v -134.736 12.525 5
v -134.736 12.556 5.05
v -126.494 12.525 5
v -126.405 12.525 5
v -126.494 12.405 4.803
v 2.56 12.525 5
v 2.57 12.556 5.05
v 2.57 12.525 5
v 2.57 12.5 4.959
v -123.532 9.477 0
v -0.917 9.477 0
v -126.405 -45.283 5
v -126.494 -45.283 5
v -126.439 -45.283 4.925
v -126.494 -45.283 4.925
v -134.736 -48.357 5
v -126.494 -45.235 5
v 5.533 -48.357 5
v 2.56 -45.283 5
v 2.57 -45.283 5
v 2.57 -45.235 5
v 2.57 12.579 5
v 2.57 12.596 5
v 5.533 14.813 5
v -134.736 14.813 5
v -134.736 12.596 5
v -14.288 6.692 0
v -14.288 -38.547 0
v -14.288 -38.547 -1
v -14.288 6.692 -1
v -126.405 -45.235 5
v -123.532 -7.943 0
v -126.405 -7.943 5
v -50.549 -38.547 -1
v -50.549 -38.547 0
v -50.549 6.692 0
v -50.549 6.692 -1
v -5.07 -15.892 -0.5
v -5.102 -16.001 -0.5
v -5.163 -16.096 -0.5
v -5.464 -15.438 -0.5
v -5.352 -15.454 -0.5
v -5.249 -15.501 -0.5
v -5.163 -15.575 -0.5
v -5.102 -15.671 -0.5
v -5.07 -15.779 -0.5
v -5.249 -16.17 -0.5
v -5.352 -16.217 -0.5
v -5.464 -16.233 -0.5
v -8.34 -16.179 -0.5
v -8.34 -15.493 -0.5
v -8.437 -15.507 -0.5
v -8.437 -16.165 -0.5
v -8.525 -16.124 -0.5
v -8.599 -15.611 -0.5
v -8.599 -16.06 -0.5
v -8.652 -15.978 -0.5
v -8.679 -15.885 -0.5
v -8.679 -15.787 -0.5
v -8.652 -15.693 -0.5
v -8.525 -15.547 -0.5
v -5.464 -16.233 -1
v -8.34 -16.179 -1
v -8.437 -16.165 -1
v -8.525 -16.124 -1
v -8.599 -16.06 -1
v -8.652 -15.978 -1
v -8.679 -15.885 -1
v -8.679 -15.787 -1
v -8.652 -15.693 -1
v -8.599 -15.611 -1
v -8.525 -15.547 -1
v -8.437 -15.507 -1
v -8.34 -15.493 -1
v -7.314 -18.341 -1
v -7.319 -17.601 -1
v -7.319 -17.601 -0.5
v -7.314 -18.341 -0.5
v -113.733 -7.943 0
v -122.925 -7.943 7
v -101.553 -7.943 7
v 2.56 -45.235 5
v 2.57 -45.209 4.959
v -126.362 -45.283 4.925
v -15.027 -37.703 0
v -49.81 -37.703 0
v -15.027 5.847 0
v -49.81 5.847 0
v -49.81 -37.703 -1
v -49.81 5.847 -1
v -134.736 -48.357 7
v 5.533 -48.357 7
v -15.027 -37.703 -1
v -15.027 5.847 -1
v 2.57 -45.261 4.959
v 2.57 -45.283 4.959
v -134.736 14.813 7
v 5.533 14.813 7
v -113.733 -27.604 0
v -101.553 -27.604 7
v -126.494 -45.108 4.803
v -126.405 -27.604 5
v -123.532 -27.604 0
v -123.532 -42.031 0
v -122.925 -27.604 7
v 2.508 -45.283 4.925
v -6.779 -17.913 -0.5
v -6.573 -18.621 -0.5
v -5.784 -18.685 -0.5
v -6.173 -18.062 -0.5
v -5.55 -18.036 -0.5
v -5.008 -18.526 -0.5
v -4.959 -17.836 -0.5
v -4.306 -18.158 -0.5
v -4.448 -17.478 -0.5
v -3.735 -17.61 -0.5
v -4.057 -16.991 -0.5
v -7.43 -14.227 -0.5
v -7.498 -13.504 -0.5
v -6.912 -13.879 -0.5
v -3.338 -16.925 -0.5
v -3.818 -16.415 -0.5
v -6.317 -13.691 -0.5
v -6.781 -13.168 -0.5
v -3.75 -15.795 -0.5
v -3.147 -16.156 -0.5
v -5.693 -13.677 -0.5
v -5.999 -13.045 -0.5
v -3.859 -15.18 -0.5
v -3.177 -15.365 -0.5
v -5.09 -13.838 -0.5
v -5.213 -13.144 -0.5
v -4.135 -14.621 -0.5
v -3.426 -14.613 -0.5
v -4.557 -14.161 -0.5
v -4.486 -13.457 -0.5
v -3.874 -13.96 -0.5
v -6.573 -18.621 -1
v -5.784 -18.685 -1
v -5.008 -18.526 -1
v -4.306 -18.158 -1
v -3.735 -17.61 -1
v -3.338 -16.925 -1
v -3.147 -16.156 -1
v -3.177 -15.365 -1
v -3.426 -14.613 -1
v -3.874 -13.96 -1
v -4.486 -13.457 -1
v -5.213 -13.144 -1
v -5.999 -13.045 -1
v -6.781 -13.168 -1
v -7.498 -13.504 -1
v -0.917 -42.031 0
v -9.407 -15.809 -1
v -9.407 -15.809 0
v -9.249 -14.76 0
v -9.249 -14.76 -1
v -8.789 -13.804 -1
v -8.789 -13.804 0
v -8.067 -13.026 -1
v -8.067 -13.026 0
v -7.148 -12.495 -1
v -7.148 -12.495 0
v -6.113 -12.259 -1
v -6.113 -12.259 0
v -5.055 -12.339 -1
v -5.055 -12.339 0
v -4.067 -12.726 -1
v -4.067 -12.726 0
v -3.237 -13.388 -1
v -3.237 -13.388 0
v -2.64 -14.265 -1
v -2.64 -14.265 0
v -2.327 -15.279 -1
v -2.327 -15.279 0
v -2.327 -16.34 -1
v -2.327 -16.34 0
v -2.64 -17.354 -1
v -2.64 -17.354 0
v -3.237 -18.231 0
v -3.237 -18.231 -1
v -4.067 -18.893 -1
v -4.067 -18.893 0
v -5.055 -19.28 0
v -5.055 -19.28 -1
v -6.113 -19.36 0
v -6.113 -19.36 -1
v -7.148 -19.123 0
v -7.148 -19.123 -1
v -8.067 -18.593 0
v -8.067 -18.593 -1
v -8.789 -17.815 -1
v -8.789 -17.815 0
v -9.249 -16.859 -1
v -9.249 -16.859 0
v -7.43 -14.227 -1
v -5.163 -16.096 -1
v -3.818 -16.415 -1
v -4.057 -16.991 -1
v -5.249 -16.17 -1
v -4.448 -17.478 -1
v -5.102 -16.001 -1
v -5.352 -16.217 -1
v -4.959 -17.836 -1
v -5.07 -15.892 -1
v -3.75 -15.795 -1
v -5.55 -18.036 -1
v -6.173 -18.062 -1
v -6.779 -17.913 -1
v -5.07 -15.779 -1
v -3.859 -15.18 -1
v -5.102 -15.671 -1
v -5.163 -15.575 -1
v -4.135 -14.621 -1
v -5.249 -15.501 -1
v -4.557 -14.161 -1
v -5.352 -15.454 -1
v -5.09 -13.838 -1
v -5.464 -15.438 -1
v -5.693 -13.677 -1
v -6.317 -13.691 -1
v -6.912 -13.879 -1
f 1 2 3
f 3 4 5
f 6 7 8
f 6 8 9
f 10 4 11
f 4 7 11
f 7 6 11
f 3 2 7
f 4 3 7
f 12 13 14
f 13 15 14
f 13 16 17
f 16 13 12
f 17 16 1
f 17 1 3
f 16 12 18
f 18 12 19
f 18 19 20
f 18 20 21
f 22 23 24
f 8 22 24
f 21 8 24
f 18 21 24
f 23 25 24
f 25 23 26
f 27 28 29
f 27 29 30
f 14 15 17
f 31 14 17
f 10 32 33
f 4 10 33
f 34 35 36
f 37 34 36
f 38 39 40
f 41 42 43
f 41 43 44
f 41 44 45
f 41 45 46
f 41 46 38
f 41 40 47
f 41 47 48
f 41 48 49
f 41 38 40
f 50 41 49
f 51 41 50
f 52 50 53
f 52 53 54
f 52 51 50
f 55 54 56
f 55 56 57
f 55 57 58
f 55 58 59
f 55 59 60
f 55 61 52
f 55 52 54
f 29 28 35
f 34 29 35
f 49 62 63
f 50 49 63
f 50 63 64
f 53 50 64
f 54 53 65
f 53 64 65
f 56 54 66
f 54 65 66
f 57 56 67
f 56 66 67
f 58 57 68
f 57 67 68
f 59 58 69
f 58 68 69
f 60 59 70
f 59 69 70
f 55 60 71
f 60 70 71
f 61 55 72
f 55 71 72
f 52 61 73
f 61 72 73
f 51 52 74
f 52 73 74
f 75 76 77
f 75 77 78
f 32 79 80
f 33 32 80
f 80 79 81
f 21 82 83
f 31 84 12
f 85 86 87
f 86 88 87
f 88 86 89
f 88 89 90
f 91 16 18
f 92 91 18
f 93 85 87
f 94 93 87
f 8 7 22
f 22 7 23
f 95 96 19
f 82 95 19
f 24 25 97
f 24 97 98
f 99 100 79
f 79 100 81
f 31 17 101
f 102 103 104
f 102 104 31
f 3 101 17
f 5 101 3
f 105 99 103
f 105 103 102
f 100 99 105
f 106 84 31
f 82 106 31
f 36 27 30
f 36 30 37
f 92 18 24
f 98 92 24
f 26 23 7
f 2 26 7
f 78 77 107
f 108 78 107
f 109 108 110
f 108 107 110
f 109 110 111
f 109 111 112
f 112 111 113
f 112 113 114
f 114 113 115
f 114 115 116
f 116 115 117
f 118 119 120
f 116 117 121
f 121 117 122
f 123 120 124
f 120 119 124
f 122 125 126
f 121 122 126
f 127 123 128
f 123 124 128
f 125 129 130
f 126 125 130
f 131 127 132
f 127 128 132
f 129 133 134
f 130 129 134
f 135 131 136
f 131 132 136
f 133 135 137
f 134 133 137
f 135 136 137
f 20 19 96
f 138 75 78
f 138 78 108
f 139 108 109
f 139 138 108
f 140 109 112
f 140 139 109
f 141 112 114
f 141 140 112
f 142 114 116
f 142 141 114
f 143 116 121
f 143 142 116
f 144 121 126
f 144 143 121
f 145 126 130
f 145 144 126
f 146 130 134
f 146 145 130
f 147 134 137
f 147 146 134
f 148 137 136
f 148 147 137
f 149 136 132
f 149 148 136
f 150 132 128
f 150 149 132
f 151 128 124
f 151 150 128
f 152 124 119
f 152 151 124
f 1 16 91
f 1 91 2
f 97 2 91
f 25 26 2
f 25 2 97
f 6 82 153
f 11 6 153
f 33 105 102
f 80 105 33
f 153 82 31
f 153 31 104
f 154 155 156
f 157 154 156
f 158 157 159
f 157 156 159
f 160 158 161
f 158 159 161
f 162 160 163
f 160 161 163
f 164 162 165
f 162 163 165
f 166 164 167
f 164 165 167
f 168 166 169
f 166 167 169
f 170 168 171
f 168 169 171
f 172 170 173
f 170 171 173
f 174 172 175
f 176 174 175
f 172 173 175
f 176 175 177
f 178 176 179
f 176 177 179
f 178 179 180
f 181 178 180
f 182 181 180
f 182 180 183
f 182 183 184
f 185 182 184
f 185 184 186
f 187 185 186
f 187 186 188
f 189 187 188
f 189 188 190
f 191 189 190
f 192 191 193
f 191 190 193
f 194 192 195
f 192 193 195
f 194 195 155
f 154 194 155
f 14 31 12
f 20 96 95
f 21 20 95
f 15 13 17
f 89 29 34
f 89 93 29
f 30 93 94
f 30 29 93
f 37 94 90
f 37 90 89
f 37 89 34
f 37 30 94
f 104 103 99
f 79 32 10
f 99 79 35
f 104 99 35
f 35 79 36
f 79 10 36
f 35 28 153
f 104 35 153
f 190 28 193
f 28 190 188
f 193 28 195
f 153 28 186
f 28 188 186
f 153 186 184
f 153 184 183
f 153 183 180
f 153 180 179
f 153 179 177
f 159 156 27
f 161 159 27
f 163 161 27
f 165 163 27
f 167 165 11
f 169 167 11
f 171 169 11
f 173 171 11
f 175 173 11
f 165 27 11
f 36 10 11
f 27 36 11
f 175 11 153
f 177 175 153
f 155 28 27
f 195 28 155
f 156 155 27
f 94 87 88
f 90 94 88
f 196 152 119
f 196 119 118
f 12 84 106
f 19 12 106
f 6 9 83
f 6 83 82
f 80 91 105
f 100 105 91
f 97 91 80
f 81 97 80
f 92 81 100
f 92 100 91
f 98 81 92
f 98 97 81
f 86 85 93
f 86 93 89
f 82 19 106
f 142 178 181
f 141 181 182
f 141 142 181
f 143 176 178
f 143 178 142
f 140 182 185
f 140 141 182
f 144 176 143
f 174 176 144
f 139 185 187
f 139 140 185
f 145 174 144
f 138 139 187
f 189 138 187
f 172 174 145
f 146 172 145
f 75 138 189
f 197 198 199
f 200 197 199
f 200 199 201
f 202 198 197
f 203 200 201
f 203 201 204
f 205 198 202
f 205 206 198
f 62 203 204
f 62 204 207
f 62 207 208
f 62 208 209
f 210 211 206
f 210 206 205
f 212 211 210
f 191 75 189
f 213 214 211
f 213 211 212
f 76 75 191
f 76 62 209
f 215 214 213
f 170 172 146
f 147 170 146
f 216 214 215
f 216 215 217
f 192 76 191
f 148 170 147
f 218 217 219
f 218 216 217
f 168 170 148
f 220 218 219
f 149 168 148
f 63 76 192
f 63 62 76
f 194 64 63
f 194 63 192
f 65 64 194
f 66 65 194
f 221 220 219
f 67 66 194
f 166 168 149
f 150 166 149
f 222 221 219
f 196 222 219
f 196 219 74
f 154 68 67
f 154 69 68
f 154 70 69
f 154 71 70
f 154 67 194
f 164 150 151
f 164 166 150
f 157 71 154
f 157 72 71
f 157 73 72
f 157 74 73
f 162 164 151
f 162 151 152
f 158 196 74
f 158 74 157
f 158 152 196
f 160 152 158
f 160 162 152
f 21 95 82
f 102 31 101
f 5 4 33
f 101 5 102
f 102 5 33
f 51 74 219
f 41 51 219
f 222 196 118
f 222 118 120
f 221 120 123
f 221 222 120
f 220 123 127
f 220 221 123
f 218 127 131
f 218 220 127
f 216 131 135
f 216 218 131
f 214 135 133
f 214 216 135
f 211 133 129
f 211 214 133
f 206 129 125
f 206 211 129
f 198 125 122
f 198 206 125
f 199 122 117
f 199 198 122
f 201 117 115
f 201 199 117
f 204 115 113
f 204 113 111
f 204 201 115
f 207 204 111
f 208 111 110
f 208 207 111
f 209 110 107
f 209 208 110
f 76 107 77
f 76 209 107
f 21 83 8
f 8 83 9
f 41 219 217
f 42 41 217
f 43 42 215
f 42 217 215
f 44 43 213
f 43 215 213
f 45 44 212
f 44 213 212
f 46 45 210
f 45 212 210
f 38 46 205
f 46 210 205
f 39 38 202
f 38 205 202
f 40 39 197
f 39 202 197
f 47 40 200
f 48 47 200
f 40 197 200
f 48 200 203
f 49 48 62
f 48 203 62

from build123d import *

# Parameters (mm, degrees)
SKETCH1_W           = 129.063503861
SKETCH1_H           = 57.862502499
BOSS_EXTRUDE1_DEPTH = 5
SKETCH2_W           = 36.260872389
SKETCH2_H           = 45.239555314
SKETCH2_W_2         = 34.782772322
SKETCH2_H_2         = 43.550253841
BOSS_EXTRUDE2_DEPTH = 1
SKETCH3_R           = 3.560103521
BOSS_EXTRUDE3_DEPTH = 1
CUT_EXTRUDE2_DEPTH  = 0.5
CUT_EXTRUDE3_DEPTH  = 0.5
SKETCH11_W          = 140.269028905
SKETCH11_H          = 63.169878757
BOSS_EXTRUDE4_DEPTH = 2
CUT_EXTRUDE11_DEPTH = 146.740563875
CUT_EXTRUDE12_DEPTH = 149.974025726
CUT_EXTRUDE15_DEPTH = 149.535595308
CUT_EXTRUDE18_DEPTH = 149.974025726
CUT_EXTRUDE20_DEPTH = 40


with BuildPart() as part:
    # Sketch1 → Boss-Extrude1 (new body)
    with BuildSketch(Plane.XY):
        with Locations((-61.962065286, -16.351878859)):
            Rectangle(SKETCH1_W, SKETCH1_H)
    extrude(amount=BOSS_EXTRUDE1_DEPTH)

    # Sketch2 → Boss-Extrude2 (add)
    with BuildSketch(Plane(origin=(0, 0, 0), x_dir=(-1, 0, 0), z_dir=(0, 0, -1))):
        with Locations((32.418116178, -15.92763049)):
            Rectangle(SKETCH2_W, SKETCH2_H)
        with Locations((32.418116178, -15.92763049)):
            Rectangle(SKETCH2_W_2, SKETCH2_H_2, mode=Mode.SUBTRACT)
    extrude(amount=BOSS_EXTRUDE2_DEPTH)

    # Sketch3 → Boss-Extrude3 (add)
    with BuildSketch(Plane(origin=(0, 0, 0), x_dir=(-1, 0, 0), z_dir=(0, 0, -1))):
        with Locations((5.84715491, -15.809376146)):
            Circle(SKETCH3_R)
    extrude(amount=BOSS_EXTRUDE3_DEPTH)

    # Sketch4 → Cut-Extrude2 (cut)
    with BuildSketch(Plane(origin=(0, 0, -1), x_dir=(-1, 0, 0), z_dir=(0, 0, -1))):
        with BuildLine():
            Line((7.498244586, -13.503730374), (7.429945817, -14.22683494))
            ThreePointArc((7.429945817, -14.22683494), (3.750240849, -15.79486572), (7.319195969, -17.600830429))
            Line((7.319195969, -17.600830429), (7.313770936, -18.341402976))
            ThreePointArc((7.313770936, -18.341402976), (3.134365244, -15.759677296), (7.498244586, -13.503730374))
        make_face()
    extrude(amount=-CUT_EXTRUDE2_DEPTH, mode=Mode.SUBTRACT)

    # Sketch5 → Cut-Extrude3 (cut)
    with BuildSketch(Plane(origin=(0, 0, -1), x_dir=(-1, 0, 0), z_dir=(0, 0, -1))):
        with BuildLine():
            Line((8.340052895, -15.49291333), (5.46397868, -15.438165983))
            ThreePointArc((5.46397868, -15.438165983), (5.066360432, -15.835784231), (5.46397868, -16.233402479))
            Line((5.46397868, -16.233402479), (8.340052895, -16.178655131))
            ThreePointArc((8.340052895, -16.178655131), (8.682923796, -15.835784231), (8.340052895, -15.49291333))
        make_face()
    extrude(amount=-CUT_EXTRUDE3_DEPTH, mode=Mode.SUBTRACT)

    # Sketch11 → Boss-Extrude4 (add)
    with BuildSketch(Plane.XY.offset(5)):
        with Locations((-64.601623086, -16.772300036)):
            Rectangle(SKETCH11_W, SKETCH11_H)
    extrude(amount=BOSS_EXTRUDE4_DEPTH)

    # Sketch12 → Cut-Extrude11 (cut, through all)
    with BuildSketch(Plane(origin=(2.569686645, 0, 0), x_dir=(0, 0, -1), z_dir=(1, 0, 0))):
        Polygon((-5.049502584, 12.555506791), (1.376837193, 8.637811028), (1.49491418, 17.884962826), align=None)
    extrude(amount=-CUT_EXTRUDE11_DEPTH, mode=Mode.SUBTRACT)

    # Sketch13 → Cut-Extrude12 (cut, through all)
    with BuildSketch(Plane(origin=(0, 14.812639343, 0), x_dir=(1, 0, 0), z_dir=(0, 1, 0))):
        Polygon((-126.405113906, -5), (-129.311029141, 1.46898876), (-122.374079844, 2.014276014), align=None)
    extrude(amount=-CUT_EXTRUDE12_DEPTH, mode=Mode.SUBTRACT)

    # Sketch14 → Cut-Extrude15 (cut, through all)
    with BuildSketch(Plane.ZY.offset(134.736137539)):
        Polygon((5, -45.234938719), (-1.330755584, -41.178219973), (-1.62330097, -49.506029315), align=None)
    extrude(amount=-CUT_EXTRUDE15_DEPTH, mode=Mode.SUBTRACT)

    # Sketch15 → Cut-Extrude18 (cut, through all)
    with BuildSketch(Plane(origin=(0, -48.357239414, 0), x_dir=(-1, 0, 0), z_dir=(0, -1, 0))):
        Polygon((-2.559600043, -5), (1.778800488, 1.23954643), (-4.071250311, 1.127548689), align=None)
    extrude(amount=-CUT_EXTRUDE18_DEPTH, mode=Mode.SUBTRACT)

    # Sketch17 → Cut-Extrude20 (cut)
    with BuildSketch(Plane(origin=(-92.862199247, 0, -53.366974362), x_dir=(-0.49826909719441087, 0, 0.8670224372996739), z_dir=(-0.8670224372996738, 0, -0.4982690971944108))):
        Polygon((67.318874173, -27.603763834), (67.318874173, -18.809544274), (67.318874173, -7.942798244), (56.669782452, -7.942798244), (56.669782452, -27.603763834), align=None)
    extrude(amount=-CUT_EXTRUDE20_DEPTH, mode=Mode.SUBTRACT)


solid = part.part
